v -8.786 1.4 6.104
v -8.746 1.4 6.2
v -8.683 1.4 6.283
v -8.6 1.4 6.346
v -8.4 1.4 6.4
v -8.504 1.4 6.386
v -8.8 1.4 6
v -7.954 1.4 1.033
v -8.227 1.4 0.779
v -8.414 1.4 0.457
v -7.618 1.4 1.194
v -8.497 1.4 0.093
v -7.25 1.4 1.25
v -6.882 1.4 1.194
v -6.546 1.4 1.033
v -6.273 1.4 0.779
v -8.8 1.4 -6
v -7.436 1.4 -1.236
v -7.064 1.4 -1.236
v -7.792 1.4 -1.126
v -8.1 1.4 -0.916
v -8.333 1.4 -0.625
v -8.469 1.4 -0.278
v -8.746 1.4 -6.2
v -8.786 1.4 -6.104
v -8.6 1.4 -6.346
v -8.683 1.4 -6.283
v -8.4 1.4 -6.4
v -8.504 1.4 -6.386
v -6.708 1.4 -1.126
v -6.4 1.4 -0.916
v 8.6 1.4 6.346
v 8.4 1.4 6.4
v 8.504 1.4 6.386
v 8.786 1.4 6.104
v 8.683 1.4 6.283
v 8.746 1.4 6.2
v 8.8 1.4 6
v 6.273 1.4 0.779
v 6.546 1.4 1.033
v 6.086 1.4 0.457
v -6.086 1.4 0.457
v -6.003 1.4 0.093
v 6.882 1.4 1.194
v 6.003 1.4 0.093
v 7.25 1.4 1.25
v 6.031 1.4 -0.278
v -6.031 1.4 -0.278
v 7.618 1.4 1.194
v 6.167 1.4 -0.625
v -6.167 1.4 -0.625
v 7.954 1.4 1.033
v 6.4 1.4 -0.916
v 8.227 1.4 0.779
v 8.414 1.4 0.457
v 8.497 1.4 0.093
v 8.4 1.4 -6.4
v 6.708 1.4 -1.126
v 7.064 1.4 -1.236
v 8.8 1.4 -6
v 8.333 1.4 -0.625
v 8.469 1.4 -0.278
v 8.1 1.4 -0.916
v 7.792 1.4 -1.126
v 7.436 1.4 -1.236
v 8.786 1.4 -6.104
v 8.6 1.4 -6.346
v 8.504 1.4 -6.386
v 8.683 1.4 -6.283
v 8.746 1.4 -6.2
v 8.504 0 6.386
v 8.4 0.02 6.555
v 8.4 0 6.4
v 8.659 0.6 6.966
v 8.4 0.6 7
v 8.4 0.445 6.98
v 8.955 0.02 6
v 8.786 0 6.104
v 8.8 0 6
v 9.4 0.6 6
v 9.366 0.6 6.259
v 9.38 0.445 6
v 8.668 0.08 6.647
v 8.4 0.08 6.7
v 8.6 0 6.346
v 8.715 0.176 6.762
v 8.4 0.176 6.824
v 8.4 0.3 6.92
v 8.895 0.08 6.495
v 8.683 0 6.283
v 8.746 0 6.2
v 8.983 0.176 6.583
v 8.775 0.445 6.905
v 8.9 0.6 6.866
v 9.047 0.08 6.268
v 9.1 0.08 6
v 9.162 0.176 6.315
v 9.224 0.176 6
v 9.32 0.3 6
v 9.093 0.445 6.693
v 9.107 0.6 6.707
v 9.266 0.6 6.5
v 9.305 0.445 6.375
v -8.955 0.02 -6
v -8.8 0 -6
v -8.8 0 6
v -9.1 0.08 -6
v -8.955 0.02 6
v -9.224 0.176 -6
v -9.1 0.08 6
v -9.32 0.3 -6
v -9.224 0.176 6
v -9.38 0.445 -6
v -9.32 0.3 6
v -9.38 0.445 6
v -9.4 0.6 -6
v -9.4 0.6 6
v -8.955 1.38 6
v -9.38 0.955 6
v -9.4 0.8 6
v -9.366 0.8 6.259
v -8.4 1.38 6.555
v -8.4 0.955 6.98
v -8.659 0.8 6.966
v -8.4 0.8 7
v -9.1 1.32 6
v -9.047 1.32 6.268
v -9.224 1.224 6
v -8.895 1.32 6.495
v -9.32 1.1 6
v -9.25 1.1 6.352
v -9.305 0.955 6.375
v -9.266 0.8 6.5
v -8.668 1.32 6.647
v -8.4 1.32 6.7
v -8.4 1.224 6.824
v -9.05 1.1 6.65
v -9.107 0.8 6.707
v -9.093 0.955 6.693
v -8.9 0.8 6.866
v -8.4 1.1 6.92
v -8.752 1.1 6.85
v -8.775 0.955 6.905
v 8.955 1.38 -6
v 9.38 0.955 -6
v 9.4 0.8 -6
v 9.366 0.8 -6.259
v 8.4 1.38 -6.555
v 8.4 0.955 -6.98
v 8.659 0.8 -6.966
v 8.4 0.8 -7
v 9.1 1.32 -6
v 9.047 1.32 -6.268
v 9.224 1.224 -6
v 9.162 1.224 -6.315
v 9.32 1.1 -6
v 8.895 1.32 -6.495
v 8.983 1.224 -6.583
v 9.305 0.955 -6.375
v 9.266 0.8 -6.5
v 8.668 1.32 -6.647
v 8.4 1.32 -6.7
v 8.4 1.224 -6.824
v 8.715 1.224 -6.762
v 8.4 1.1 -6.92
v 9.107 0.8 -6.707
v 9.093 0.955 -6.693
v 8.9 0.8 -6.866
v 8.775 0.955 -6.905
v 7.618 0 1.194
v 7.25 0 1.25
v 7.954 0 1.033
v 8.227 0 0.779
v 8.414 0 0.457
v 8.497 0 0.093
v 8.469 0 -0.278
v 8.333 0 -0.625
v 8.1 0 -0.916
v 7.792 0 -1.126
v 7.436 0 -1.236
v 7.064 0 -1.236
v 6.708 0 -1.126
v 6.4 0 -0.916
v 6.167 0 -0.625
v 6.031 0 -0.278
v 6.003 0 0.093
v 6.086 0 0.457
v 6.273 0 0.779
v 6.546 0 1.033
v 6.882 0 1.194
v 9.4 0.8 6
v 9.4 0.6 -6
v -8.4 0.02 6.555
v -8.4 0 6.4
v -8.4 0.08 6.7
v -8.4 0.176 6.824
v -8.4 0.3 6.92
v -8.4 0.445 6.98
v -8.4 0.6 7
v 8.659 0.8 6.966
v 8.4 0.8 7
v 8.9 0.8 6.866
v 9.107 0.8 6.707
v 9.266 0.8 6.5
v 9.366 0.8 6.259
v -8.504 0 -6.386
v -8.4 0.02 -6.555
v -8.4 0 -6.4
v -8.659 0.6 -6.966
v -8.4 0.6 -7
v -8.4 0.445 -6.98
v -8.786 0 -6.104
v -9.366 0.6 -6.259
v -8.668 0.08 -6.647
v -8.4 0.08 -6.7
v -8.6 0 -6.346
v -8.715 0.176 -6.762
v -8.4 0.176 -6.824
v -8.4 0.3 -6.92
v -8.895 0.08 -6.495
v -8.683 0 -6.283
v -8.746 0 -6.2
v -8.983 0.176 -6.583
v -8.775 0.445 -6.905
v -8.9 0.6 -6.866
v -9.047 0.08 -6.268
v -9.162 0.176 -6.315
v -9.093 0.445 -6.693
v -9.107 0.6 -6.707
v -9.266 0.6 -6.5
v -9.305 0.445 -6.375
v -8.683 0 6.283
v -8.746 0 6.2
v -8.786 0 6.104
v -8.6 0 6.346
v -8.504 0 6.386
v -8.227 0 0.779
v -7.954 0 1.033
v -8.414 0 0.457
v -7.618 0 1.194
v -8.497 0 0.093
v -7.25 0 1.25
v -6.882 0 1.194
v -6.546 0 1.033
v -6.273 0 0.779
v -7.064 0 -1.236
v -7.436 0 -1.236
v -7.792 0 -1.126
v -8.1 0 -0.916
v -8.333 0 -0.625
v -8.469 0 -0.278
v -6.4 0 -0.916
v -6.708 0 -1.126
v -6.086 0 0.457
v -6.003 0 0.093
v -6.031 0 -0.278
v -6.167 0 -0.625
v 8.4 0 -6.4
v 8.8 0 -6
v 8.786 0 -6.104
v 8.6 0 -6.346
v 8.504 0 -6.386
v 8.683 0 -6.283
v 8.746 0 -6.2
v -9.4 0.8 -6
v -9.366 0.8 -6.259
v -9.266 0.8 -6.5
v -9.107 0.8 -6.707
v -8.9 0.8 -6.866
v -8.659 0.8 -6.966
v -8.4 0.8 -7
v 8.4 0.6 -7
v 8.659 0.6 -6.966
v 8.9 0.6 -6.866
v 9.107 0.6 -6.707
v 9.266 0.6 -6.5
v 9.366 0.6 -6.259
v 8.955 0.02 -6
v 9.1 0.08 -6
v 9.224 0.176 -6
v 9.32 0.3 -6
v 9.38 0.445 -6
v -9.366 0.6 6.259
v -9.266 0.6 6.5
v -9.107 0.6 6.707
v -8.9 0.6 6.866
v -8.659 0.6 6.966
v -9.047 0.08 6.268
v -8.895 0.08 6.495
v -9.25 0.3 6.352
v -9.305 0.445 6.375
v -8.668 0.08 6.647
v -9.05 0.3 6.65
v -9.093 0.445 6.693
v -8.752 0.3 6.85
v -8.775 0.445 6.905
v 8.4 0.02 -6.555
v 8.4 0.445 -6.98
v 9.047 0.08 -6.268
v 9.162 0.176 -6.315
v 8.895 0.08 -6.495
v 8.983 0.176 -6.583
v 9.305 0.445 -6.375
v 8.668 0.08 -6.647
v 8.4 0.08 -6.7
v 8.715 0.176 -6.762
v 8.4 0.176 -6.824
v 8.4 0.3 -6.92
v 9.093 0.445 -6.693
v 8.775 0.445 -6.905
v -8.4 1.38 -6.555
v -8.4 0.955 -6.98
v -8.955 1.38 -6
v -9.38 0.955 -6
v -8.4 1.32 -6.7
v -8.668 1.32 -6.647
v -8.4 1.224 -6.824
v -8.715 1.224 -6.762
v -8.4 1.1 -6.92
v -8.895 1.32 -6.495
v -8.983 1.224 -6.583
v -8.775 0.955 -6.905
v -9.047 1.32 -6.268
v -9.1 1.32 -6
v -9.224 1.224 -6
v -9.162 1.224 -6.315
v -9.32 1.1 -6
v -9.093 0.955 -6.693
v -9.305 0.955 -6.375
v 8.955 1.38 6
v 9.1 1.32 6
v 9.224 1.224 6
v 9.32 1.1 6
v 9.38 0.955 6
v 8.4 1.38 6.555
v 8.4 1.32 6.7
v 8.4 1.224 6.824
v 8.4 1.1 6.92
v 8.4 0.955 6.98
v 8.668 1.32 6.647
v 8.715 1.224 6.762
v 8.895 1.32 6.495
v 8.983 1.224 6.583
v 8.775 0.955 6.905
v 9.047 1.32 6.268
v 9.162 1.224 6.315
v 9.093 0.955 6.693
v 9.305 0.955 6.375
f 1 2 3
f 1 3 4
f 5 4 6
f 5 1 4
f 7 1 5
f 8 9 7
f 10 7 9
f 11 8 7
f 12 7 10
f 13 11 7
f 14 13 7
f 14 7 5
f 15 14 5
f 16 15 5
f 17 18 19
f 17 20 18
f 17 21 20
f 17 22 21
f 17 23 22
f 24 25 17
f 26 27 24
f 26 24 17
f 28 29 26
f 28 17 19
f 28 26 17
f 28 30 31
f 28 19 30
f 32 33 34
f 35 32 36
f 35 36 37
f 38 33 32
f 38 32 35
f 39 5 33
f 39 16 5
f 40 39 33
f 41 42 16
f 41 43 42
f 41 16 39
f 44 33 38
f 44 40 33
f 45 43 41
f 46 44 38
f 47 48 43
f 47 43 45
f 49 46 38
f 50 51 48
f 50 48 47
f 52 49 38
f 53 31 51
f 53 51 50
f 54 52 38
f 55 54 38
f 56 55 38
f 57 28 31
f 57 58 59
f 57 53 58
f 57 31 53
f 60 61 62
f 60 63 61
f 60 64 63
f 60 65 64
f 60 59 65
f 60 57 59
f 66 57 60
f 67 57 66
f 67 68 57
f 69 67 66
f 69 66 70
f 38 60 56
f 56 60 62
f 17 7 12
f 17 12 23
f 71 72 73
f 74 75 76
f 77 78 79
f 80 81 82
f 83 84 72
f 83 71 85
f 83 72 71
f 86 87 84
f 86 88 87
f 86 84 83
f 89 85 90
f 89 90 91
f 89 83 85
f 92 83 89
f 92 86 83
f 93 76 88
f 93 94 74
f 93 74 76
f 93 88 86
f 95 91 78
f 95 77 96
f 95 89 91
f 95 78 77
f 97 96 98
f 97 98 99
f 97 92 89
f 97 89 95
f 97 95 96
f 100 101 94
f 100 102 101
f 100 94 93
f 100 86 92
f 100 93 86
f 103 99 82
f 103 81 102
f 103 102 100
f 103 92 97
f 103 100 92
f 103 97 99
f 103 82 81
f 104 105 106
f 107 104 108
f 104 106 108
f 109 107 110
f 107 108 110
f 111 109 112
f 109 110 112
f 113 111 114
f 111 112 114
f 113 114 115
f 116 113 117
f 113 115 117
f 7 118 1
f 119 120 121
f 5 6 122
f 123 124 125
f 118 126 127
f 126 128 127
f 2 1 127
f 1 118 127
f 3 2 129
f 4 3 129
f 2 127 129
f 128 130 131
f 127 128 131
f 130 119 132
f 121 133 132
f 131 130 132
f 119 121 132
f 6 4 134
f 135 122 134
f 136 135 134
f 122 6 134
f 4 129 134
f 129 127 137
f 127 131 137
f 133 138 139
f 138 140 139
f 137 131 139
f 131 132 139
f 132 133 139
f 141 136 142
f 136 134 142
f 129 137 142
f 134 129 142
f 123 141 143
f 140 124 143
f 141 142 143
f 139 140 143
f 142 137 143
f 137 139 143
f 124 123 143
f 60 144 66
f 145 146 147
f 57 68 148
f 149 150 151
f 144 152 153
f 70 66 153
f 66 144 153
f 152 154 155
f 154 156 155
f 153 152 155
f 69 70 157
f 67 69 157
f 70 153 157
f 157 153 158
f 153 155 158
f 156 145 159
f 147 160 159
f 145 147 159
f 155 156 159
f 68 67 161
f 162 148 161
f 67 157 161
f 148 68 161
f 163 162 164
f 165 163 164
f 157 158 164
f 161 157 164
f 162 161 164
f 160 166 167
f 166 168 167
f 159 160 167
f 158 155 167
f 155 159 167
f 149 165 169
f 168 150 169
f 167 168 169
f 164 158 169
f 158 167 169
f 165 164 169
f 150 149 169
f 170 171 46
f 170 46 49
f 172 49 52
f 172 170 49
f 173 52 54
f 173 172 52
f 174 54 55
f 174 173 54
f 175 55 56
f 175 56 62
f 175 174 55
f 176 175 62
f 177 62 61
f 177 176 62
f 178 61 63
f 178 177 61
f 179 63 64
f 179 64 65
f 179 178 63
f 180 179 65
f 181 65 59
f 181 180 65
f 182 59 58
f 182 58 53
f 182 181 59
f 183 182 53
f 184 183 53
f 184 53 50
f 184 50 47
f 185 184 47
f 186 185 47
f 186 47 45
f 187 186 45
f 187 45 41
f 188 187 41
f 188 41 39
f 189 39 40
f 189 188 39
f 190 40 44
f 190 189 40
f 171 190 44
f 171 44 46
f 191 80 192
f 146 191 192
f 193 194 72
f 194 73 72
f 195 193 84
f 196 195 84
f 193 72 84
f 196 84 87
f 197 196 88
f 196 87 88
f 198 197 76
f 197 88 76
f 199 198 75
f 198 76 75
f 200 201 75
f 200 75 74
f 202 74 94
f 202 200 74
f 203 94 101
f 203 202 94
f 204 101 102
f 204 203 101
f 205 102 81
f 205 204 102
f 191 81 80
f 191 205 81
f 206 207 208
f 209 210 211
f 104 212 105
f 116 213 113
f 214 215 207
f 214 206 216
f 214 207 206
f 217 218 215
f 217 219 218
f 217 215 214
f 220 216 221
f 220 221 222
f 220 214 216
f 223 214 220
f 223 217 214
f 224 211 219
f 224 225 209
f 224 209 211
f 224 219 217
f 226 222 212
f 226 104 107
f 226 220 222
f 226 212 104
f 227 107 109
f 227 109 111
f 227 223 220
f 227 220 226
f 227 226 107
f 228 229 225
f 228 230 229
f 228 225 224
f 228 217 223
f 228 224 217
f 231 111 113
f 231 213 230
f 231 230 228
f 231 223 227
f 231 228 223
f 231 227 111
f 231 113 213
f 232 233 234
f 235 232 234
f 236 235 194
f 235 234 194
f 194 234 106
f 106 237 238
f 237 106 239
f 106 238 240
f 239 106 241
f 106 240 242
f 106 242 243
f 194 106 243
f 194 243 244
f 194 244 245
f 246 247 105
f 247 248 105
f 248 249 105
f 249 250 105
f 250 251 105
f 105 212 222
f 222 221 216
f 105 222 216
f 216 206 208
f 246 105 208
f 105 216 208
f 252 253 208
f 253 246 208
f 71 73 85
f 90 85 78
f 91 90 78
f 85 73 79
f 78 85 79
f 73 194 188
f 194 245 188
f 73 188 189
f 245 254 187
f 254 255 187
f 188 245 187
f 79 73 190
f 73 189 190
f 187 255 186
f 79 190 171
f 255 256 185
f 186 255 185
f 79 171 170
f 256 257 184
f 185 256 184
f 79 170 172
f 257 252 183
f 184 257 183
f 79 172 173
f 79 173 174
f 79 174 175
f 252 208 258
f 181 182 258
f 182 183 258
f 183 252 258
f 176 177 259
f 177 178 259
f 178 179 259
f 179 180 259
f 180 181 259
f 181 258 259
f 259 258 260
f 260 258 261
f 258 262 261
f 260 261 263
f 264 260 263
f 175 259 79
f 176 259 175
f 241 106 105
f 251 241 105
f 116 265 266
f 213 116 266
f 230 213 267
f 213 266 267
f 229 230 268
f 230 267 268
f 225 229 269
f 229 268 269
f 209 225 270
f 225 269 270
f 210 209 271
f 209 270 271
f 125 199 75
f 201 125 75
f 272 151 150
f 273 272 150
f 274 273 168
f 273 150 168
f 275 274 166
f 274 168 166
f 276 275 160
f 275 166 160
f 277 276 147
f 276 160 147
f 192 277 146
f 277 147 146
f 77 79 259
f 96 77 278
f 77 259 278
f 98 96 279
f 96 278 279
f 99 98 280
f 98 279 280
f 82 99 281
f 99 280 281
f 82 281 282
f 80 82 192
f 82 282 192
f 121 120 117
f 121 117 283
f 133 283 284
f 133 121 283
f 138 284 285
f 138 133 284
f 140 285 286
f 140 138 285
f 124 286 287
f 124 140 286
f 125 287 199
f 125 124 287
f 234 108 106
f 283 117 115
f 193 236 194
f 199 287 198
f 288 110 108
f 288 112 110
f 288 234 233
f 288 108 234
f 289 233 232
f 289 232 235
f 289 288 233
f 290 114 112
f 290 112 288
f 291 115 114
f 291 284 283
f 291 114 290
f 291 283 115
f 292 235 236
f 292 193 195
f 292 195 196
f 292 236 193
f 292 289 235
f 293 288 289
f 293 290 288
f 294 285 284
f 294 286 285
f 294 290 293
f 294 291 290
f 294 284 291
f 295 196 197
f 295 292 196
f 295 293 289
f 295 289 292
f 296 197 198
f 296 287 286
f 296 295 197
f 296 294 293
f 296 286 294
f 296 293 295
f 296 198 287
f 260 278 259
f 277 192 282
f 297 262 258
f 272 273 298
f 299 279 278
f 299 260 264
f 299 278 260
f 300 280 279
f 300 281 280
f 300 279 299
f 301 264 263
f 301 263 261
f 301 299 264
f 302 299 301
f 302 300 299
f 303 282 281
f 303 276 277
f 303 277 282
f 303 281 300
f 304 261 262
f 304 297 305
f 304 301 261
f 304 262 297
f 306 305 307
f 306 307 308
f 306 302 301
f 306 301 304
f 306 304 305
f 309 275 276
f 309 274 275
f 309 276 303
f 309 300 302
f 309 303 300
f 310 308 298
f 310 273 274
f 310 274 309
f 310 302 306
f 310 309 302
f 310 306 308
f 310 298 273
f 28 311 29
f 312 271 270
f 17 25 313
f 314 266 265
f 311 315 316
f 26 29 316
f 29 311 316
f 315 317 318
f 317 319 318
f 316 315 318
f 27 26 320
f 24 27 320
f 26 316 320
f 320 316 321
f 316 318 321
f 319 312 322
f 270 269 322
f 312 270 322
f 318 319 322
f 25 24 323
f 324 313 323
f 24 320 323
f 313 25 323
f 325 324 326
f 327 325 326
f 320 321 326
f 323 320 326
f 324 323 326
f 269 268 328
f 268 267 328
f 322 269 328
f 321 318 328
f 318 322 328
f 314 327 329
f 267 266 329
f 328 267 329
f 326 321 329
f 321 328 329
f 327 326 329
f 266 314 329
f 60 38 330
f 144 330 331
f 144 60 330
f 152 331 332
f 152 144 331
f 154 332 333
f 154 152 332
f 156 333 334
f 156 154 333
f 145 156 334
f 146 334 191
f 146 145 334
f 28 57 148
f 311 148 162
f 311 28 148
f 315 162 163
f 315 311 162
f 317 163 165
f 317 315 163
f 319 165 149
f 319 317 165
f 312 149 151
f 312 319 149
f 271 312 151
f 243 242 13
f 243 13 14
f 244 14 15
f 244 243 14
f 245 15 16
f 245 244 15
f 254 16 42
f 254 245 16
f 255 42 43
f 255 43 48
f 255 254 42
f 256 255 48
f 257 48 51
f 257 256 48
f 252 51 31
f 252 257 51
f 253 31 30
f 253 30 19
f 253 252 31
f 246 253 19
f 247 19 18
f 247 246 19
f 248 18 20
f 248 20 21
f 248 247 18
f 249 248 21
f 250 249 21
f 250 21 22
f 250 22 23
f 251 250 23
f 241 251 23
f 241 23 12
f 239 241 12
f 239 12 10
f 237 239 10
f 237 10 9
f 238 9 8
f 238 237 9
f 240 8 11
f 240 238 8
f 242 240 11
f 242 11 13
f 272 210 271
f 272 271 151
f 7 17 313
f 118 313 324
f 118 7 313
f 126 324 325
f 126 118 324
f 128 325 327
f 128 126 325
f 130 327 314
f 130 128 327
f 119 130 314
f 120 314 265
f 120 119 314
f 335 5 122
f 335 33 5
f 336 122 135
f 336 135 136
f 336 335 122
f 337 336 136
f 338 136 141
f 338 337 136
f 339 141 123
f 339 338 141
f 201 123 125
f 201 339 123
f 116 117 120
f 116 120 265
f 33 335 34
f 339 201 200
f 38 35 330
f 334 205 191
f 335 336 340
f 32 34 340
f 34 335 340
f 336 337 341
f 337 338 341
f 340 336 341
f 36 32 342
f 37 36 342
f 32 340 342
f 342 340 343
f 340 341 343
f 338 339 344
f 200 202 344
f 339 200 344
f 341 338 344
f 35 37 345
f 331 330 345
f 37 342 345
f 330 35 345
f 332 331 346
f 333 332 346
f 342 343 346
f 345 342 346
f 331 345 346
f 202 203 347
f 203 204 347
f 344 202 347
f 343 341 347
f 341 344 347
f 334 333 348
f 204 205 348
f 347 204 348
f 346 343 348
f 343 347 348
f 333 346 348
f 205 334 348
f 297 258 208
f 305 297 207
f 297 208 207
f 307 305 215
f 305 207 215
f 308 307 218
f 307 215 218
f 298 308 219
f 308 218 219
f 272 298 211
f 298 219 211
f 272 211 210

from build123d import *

# Parameters (mm, degrees)
SKETCH1_W                 = 18.8
SKETCH1_H                 = 14
SKETCH1_R                 = 1.25
CABLE_PLATE_EXTRUDE_DEPTH = 1.4
FILLET2_R                 = 1
FILLET1_R                 = 0.6


with BuildPart() as part:
    # Sketch1 → Cable Plate Extrude (new body)
    with BuildSketch(Plane(origin=(0, 0, 0), x_dir=(1, 0, 0), z_dir=(0, 1, 0))):
        Rectangle(SKETCH1_W, SKETCH1_H)
        with Locations(Location((-7.25, 0, 0), (0, 0, 270))):
            Circle(SKETCH1_R, mode=Mode.SUBTRACT)
        with Locations(Location((7.25, 0, 0), (0, 0, 270))):
            Circle(SKETCH1_R, mode=Mode.SUBTRACT)
    extrude(amount=CABLE_PLATE_EXTRUDE_DEPTH)

    # Fillet2
    fillet2_edges = [part.edges().sort_by_distance(p)[0] for p in [
        (-9.4, 0.7, -7),
        (9.4, 0.7, -7),
        (9.4, 0.7, 7),
        (-9.4, 0.7, 7),
    ]]
    fillet(fillet2_edges, radius=FILLET2_R)

    # Fillet1
    fillet1_edges = [part.edges().sort_by_distance(p)[0] for p in [
        (0, 0, 7),
        (0, 1.4, 7),
        (-9.4, 0, 0),
        (0, 0, -7),
        (9.4, 0, 0),
        (-9.107106781, 0, -6.707106781),
        (9.107106781, 0, -6.707106781),
        (9.107106781, 0, 6.707106781),
        (-9.107106781, 0, 6.707106781),
        (-9.4, 1.4, 0),
        (9.4, 1.4, 0),
        (0, 1.4, -7),
        (-9.107106781, 1.4, -6.707106781),
        (9.107106781, 1.4, -6.707106781),
        (9.107106781, 1.4, 6.707106781),
        (-9.107106781, 1.4, 6.707106781),
    ]]
    fillet(fillet1_edges, radius=FILLET1_R)


solid = part.part
